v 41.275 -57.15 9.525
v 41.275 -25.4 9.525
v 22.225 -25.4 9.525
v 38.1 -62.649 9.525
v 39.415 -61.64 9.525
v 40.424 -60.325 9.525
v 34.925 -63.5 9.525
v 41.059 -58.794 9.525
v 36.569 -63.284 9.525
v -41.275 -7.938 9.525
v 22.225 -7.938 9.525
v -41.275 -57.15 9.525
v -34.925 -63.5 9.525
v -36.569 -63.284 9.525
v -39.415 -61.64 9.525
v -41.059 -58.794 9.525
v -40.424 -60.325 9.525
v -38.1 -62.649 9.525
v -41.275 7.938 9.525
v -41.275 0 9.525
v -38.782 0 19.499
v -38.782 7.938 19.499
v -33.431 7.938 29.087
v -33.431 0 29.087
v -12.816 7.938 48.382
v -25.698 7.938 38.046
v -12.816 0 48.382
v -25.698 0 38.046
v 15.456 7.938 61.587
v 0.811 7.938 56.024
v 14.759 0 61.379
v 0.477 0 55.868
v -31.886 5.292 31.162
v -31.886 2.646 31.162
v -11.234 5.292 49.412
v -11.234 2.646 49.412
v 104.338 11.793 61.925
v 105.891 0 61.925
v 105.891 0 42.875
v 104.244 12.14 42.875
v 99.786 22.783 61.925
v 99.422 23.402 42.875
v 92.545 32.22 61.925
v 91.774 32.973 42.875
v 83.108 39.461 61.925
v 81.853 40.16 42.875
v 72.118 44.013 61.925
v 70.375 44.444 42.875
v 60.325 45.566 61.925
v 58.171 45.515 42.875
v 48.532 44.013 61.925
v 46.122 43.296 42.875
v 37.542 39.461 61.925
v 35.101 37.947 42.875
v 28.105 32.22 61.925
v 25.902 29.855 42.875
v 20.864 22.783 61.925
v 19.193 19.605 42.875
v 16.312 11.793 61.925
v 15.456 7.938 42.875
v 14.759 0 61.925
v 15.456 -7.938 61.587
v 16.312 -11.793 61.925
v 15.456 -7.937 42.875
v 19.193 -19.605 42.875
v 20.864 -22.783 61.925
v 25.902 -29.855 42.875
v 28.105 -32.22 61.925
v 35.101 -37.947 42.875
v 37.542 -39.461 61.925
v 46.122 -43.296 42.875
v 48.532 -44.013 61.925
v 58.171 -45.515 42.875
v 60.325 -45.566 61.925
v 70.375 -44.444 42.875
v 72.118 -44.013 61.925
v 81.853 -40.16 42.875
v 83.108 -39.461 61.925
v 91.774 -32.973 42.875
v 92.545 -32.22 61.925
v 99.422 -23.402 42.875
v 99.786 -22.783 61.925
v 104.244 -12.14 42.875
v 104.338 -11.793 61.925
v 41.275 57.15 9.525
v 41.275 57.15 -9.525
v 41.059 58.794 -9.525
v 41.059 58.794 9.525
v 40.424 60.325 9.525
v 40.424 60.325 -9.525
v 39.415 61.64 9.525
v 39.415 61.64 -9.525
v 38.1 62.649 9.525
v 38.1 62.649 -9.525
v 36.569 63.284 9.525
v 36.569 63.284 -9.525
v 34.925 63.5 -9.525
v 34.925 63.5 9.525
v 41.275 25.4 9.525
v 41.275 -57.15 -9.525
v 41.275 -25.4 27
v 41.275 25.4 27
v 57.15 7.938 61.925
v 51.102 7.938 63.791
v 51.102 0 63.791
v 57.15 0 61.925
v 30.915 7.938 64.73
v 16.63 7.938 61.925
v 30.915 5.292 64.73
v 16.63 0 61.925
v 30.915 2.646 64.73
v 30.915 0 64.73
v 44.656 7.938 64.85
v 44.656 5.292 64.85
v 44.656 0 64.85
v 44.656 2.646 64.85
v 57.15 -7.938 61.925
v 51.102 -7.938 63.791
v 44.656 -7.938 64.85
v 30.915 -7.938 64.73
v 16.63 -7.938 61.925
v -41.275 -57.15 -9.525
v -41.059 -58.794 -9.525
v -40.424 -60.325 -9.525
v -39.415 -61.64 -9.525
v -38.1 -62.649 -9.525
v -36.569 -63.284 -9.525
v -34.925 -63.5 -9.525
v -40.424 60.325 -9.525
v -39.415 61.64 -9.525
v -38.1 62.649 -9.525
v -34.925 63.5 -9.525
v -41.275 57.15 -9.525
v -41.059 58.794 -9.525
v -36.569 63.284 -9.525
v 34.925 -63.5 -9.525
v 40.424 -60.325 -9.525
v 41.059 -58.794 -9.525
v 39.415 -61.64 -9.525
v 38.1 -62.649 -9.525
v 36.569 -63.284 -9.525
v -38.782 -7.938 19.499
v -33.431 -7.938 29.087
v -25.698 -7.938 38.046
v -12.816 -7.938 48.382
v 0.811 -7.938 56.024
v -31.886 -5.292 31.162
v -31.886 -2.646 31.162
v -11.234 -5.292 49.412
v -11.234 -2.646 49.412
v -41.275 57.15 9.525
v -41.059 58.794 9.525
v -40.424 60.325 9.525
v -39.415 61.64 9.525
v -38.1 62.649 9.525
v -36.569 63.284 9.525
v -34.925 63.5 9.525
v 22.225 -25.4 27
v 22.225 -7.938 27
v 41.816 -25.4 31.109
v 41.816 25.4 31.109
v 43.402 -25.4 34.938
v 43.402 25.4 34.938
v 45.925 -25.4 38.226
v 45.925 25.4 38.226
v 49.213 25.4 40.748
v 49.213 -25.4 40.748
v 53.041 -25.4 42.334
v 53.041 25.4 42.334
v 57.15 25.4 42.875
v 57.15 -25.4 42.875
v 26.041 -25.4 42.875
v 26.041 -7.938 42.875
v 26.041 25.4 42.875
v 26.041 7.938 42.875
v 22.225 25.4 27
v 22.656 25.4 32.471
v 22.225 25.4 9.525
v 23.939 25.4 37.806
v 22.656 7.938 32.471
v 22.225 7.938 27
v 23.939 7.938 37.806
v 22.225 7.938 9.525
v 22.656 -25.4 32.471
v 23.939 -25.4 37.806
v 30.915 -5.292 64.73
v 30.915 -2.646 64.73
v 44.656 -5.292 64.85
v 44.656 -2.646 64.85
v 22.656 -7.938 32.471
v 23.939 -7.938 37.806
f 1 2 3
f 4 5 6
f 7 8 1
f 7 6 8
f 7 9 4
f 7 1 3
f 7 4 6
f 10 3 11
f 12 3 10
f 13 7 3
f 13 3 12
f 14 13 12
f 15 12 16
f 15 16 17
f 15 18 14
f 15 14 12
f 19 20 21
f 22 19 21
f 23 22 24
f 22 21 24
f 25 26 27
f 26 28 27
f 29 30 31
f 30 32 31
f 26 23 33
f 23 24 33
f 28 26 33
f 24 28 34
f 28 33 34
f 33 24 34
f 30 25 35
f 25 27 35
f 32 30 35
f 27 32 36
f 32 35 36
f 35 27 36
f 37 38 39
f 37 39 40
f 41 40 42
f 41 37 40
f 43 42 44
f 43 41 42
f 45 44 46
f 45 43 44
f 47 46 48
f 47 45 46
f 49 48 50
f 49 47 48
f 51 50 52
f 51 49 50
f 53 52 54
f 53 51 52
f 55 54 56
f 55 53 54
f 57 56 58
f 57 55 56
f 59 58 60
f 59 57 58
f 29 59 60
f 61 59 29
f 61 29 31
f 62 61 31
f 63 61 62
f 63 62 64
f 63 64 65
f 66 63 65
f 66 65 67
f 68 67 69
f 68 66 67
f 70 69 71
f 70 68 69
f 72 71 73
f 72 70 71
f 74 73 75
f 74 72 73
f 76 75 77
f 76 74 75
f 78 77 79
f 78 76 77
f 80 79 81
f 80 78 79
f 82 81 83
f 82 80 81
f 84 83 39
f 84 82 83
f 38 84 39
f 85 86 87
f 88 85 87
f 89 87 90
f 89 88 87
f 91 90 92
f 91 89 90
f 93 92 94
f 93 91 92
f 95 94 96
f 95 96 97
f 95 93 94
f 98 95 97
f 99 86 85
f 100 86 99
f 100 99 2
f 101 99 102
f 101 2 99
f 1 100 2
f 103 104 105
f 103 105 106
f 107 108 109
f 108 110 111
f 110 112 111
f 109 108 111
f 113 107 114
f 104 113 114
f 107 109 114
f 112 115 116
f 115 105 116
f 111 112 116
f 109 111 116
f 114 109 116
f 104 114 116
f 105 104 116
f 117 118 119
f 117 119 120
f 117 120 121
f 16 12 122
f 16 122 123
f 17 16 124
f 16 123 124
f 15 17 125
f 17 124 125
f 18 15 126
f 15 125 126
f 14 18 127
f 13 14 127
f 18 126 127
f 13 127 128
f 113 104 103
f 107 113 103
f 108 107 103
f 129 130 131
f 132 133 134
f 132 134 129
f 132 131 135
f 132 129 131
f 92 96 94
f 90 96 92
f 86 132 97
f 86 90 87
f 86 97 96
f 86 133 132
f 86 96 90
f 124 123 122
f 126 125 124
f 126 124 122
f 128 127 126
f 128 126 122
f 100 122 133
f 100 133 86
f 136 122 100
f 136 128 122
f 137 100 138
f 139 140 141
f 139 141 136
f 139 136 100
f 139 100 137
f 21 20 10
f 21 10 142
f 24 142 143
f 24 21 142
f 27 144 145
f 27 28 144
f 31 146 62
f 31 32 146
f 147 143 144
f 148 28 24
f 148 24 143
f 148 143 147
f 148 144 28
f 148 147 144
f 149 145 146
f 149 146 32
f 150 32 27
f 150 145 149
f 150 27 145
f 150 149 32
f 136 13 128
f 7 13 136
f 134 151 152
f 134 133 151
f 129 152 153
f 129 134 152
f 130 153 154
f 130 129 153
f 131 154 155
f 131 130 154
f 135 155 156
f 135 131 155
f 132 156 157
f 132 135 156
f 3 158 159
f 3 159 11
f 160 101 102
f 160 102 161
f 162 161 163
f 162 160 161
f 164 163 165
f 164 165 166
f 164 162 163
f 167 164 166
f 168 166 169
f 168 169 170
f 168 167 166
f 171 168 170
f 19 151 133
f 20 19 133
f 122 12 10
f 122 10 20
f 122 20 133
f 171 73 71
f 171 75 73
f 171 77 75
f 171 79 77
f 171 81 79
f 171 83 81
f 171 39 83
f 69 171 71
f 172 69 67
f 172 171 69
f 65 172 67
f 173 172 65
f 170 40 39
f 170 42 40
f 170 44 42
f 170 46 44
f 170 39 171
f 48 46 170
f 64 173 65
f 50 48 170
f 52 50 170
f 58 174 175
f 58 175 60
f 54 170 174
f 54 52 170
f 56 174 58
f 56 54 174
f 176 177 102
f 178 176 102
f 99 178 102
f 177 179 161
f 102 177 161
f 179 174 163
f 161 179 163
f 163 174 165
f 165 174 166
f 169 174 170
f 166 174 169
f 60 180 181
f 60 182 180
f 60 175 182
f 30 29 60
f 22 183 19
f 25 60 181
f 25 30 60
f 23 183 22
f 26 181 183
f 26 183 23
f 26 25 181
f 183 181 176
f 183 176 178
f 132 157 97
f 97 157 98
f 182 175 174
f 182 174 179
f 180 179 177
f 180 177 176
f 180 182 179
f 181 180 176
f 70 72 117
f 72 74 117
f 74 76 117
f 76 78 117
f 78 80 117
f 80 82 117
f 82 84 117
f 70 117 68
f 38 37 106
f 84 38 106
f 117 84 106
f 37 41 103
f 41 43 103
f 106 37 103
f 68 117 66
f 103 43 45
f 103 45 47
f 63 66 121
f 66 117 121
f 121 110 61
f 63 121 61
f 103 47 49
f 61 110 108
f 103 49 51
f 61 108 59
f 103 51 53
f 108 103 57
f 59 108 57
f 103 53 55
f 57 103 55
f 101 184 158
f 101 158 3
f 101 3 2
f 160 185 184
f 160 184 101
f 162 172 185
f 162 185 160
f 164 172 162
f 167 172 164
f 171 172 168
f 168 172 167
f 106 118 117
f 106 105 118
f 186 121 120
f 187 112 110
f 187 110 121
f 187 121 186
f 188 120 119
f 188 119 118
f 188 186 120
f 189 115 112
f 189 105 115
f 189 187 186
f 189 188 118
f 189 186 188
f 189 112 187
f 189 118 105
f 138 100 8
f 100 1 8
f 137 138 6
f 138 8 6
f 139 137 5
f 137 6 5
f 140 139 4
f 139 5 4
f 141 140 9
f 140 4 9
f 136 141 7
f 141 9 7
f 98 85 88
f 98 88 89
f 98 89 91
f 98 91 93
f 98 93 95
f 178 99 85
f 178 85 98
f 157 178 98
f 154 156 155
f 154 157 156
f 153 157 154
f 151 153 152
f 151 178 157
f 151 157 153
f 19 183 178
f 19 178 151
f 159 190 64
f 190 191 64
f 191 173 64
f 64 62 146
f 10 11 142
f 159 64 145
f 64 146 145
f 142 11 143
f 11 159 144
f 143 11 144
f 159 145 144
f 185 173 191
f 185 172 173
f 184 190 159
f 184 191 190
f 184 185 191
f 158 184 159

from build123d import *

# Parameters (mm, degrees)
F1_DEPTH = 63.5
F2_DEPTH = 25.4
F3_DEPTH = 7.9375
F0_W     = 45.5656475117
F0_H     = 19.05
F5_R     = 6.35


with BuildPart() as f1:
    # F0 (on Front) → F1 (new body, symmetric)
    with BuildSketch(Plane.XZ):
        Polygon((22.225, 9.525), (-41.275, 9.525), (-41.275, -9.525), (41.275, -9.525), (41.275, 9.525), align=None)
    extrude(amount=F1_DEPTH, both=True)

    # F0 (on Front) → F2 (join, symmetric)
    with BuildSketch(Plane.XZ):
        with BuildLine():
            Line((22.225, 27.0002), (22.225, 9.525))
            Line((22.225, 9.525), (41.275, 9.525))
            Line((41.275, 9.525), (41.275, 27.0002))
            ThreePointArc((41.275, 27.0002), (45.9246798487, 38.2255201513), (57.15, 42.8752))
            Line((57.15, 42.8752), (60.325, 42.8752))
            Line((60.325, 42.8752), (60.325, 61.9252))
            Line((60.325, 61.9252), (57.15, 61.9252))
            ThreePointArc((57.15, 61.9252), (32.4542956671, 51.6959043329), (22.225, 27.0002))
        make_face()
    extrude(amount=F2_DEPTH, both=True)

    # F0 (on Front) → F3 (join, symmetric)
    with BuildSketch(Plane.XZ):
        with BuildLine():
            add(Edge.make_bspline(
                [(-41.275, 9.525), (-38.2011030893, 43.7511456965), (22.4494743774, 75.5444682119), (57.15, 61.9252)],
                knots=[0, 0, 0, 0, 111.5045361635, 111.5045361635, 111.5045361635, 111.5045361635], degree=3))
            Line((-41.275, 9.525), (22.225, 9.525))
            Line((22.225, 9.525), (22.225, 27.0002))
            ThreePointArc((22.225, 27.0002), (32.4542956671, 51.6959043329), (57.15, 61.9252))
        make_face()
    extrude(amount=F3_DEPTH, both=True)

    # F0 (on Front) → F4 (revolve)
    with BuildSketch(Plane.XZ):
        with Locations((83.1078237558, 52.4002)):
            Rectangle(F0_W, F0_H)
    revolve(axis=Axis((60.325, 0, 52.3875), (0, 0, 1)))

    # F5
    f5_edges = [f1.edges().sort_by_distance(p)[0] for p in [
        (41.275, -63.5, 0),
        (-41.275, -63.5, 0),
        (41.275, 63.5, 0),
        (-41.275, 63.5, 0),
    ]]
    fillet(f5_edges, radius=F5_R)


solid = f1.part
